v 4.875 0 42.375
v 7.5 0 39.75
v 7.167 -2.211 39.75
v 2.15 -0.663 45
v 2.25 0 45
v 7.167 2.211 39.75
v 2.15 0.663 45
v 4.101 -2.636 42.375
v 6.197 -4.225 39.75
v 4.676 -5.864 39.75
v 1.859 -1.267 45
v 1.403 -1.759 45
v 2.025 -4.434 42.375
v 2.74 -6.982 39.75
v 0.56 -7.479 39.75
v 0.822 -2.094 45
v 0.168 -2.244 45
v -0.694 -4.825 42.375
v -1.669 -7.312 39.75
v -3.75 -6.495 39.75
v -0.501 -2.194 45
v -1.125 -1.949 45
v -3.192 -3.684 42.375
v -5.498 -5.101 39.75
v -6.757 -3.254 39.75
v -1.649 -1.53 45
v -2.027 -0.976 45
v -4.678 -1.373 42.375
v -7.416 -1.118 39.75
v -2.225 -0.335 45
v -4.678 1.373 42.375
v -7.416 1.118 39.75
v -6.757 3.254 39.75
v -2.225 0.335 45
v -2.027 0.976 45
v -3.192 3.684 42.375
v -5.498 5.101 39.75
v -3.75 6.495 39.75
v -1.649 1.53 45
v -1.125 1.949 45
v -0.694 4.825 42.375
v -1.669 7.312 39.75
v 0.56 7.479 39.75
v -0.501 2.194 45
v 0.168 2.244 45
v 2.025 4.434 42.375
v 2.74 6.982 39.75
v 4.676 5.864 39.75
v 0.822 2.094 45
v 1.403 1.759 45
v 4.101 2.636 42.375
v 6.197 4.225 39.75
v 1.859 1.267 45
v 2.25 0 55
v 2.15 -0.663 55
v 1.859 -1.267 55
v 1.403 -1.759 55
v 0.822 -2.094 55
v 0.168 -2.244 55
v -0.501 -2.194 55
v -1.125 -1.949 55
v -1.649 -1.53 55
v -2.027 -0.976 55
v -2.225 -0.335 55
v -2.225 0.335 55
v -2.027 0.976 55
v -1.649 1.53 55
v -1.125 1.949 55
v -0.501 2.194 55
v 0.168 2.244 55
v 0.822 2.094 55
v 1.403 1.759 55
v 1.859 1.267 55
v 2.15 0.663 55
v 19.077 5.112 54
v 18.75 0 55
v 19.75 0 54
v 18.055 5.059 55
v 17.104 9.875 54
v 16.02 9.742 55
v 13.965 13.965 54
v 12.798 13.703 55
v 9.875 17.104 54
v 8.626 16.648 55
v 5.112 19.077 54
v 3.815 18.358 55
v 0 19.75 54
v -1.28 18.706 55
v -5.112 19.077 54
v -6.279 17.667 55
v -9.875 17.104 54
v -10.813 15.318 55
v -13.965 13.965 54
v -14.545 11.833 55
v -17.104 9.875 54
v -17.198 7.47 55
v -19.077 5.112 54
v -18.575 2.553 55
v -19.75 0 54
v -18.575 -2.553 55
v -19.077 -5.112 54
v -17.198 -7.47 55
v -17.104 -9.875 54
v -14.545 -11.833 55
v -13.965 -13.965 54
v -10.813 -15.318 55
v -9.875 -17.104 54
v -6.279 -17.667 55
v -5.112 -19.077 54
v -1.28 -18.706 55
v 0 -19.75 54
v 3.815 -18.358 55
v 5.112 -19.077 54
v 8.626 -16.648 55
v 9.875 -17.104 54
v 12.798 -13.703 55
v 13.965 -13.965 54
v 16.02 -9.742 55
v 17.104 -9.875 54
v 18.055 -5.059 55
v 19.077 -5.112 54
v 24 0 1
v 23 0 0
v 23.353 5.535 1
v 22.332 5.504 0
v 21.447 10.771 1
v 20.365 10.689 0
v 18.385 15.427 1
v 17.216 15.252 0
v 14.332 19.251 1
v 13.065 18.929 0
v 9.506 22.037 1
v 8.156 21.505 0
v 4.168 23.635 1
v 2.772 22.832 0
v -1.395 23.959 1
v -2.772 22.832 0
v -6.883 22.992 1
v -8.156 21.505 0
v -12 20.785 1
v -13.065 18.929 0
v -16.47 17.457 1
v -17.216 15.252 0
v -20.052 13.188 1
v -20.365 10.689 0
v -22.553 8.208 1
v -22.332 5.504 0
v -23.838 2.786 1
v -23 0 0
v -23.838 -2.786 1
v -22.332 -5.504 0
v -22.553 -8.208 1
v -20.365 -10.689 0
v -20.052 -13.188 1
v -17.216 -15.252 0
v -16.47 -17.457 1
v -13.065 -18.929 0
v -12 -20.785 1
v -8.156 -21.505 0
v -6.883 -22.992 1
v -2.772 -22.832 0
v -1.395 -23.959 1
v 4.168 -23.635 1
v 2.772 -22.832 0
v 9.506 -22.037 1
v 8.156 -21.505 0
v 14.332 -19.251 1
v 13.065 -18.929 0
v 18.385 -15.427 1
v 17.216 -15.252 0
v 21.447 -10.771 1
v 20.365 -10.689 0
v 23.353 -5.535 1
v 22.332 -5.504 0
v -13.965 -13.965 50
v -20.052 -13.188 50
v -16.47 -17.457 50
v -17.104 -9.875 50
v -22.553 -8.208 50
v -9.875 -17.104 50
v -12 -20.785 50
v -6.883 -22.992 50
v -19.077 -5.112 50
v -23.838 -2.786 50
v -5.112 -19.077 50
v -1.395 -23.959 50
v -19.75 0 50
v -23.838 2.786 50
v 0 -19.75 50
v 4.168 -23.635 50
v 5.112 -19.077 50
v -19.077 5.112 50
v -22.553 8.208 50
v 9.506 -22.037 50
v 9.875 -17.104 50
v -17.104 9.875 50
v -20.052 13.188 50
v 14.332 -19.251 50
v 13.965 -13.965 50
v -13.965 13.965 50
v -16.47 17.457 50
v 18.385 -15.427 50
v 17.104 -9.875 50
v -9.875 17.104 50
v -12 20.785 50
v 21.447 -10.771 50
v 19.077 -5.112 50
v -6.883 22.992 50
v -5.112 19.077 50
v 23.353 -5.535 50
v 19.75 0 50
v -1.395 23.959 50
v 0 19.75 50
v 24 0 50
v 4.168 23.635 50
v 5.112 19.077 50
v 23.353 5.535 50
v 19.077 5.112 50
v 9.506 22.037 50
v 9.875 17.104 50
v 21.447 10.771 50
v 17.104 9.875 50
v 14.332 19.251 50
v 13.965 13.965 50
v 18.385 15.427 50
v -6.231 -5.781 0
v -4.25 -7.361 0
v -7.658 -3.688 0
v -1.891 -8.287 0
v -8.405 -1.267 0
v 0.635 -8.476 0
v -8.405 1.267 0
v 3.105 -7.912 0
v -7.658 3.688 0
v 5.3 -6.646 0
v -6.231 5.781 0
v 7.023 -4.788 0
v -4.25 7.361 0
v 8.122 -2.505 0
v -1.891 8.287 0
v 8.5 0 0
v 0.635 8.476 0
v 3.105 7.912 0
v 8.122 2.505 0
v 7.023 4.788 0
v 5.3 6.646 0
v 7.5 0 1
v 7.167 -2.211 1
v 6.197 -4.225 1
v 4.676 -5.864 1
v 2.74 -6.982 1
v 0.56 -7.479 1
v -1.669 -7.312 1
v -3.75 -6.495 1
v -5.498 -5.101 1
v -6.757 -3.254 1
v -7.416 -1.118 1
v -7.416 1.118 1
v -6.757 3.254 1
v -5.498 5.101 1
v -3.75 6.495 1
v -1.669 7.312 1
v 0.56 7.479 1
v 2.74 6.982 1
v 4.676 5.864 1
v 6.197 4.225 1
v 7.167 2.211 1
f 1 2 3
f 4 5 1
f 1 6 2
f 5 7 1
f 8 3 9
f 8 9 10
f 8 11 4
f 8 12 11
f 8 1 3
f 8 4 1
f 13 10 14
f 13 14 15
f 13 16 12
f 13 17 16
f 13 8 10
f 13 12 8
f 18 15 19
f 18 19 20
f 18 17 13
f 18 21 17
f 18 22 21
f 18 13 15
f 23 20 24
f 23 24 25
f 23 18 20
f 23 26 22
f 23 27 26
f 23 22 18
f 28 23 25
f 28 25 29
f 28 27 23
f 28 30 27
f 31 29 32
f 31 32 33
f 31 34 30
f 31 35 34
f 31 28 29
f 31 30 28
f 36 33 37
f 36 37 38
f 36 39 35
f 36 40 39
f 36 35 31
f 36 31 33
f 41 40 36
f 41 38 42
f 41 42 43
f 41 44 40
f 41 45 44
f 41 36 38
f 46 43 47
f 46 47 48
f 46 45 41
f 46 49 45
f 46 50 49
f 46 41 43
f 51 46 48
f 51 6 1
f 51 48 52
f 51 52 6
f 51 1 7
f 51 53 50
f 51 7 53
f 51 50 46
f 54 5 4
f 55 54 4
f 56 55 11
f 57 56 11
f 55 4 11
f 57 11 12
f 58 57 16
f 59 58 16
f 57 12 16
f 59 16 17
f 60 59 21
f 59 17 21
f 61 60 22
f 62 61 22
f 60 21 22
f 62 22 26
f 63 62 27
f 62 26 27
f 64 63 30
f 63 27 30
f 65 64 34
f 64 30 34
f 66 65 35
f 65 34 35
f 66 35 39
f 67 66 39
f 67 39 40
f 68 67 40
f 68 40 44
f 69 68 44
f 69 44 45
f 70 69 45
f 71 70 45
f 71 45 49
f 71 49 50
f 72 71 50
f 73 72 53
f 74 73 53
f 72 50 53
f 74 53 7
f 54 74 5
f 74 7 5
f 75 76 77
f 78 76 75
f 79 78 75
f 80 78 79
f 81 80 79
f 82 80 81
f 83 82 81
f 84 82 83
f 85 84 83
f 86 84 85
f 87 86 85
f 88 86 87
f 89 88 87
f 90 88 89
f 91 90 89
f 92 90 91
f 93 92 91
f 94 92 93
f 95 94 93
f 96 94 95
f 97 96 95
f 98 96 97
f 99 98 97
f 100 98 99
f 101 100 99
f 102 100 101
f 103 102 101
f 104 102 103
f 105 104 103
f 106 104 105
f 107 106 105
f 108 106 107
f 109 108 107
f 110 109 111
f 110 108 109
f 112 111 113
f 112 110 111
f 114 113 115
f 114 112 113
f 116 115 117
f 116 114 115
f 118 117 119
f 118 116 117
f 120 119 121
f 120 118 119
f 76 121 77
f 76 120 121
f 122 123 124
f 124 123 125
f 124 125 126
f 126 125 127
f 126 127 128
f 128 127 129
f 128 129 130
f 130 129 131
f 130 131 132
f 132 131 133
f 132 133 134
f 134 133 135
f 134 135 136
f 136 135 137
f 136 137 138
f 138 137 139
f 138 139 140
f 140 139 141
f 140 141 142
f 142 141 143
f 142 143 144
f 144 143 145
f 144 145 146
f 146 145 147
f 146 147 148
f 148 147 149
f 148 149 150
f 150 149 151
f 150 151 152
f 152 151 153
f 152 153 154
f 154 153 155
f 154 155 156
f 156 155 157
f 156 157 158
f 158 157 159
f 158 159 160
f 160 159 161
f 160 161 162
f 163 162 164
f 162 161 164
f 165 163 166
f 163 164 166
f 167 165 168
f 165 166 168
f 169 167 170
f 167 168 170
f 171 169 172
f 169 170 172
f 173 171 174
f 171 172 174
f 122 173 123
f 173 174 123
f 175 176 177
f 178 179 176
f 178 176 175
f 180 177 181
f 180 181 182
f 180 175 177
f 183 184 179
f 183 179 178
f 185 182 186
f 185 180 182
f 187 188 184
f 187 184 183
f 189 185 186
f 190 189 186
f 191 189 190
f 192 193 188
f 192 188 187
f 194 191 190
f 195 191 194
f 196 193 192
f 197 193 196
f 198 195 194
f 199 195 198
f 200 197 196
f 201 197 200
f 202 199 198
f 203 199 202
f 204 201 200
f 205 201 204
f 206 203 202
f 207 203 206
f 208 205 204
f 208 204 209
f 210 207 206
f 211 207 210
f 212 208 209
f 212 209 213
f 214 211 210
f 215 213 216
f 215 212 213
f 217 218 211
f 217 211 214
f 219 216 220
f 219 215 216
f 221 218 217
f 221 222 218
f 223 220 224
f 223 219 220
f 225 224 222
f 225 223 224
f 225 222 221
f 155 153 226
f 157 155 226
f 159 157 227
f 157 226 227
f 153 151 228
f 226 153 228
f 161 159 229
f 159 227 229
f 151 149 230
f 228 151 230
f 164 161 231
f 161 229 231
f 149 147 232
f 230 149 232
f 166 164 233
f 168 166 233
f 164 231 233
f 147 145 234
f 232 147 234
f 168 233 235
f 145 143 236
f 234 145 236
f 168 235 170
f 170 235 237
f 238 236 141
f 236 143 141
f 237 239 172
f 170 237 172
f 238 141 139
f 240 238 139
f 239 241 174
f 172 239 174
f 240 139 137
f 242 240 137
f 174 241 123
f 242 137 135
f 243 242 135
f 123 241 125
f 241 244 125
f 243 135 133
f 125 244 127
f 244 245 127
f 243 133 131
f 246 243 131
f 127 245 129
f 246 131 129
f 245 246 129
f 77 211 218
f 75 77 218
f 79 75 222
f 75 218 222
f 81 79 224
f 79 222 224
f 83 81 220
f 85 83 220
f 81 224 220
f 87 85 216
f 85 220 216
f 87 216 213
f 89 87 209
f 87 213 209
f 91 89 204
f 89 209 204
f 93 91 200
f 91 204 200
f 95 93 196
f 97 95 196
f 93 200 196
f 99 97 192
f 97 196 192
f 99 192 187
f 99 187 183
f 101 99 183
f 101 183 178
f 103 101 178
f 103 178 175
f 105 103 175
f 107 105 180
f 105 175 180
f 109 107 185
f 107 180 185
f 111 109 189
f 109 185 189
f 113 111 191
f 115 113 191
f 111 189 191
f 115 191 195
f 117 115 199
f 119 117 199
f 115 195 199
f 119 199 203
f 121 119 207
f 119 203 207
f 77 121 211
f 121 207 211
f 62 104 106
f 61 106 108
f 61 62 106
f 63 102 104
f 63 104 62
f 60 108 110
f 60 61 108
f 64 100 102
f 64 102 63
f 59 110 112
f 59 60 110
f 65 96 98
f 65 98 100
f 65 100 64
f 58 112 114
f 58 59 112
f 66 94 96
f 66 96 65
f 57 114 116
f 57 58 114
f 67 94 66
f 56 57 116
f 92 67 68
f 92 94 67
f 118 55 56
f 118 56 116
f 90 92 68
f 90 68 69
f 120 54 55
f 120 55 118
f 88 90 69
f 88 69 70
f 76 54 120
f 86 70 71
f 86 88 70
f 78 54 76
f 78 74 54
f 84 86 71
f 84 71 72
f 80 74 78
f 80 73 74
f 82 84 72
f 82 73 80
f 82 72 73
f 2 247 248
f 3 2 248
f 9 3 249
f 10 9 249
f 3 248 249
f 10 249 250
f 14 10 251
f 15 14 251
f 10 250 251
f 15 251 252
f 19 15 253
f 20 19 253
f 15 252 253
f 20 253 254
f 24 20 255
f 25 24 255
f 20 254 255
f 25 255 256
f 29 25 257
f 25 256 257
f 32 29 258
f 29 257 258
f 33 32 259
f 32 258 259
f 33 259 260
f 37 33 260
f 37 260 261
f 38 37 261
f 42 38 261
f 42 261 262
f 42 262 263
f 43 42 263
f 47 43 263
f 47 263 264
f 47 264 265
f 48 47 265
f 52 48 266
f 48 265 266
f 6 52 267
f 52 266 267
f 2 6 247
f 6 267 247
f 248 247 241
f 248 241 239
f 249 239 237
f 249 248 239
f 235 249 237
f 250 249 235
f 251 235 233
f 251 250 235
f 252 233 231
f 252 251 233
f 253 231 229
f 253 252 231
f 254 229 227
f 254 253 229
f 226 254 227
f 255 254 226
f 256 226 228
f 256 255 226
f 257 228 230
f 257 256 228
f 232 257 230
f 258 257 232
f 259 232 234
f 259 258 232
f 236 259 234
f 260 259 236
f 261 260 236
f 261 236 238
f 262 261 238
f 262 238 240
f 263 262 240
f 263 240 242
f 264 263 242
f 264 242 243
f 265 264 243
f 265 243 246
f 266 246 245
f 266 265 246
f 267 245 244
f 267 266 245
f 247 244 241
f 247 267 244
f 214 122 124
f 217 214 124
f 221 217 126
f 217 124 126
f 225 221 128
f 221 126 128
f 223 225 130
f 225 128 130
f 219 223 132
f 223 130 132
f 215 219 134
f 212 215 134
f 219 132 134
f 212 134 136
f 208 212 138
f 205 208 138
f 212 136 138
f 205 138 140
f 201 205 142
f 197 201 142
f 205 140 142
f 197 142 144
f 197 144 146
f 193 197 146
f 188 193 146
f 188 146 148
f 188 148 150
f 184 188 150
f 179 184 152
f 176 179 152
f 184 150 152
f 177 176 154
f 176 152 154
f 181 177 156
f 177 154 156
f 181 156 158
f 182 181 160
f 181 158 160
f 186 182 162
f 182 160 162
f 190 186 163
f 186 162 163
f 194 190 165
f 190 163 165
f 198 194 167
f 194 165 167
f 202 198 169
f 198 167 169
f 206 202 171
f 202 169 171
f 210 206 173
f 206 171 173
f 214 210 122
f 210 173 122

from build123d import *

# Parameters (mm, degrees)
F0_R     = 24
F1_DEPTH = 50
F2_R     = 19.75
F3_DEPTH = 5
F4_R     = 7.5
F5_DEPTH = 45
F6_R     = 2.25
F7_DEPTH = 10
F8_SIZE  = 1
F9_SIZE  = 5.24999


# Not quite as in the source:
# - a fillet or chamfer is up to 0.001 mm smaller than in the source, because OpenCascade refuses the exact size


with BuildPart() as f1:
    # F0 (on Top) → F1 (new body)
    with BuildSketch(Plane.XY):
        Circle(F0_R)
    extrude(amount=F1_DEPTH)

    # F2 (on face) → F3 (join)
    with BuildSketch(Plane.XY.offset(50)):
        Circle(F2_R)
    extrude(amount=F3_DEPTH)

    # F4 (on face) → F5 (cut)
    with BuildSketch(Plane(origin=(0, 0, 0), x_dir=(1, 0, 0), z_dir=(0, 0, -1))):
        Circle(F4_R)
    extrude(amount=-F5_DEPTH, mode=Mode.SUBTRACT)

    # F6 (on face) → F7 (cut)
    with BuildSketch(Plane(origin=(0, 0, 45), x_dir=(1, 0, 0), z_dir=(0, 0, -1))):
        Circle(F6_R)
    extrude(amount=-F7_DEPTH, mode=Mode.SUBTRACT)

    # F8
    f8_edges = [f1.edges().sort_by_distance(p)[0] for p in [
        (-24, 0, 0),
        (-7.5, 0, 0),
        (-19.75, 0, 55),
    ]]
    chamfer(f8_edges, length=F8_SIZE)

    # F9 (size 5.25 in the source; OpenCascade refuses exactly that, so slightly less here)
    f9_edges = [f1.edges().sort_by_distance(p)[0] for p in [
        (-7.5, 0, 45),
    ]]
    chamfer(f9_edges, length=F9_SIZE)


solid = f1.part
